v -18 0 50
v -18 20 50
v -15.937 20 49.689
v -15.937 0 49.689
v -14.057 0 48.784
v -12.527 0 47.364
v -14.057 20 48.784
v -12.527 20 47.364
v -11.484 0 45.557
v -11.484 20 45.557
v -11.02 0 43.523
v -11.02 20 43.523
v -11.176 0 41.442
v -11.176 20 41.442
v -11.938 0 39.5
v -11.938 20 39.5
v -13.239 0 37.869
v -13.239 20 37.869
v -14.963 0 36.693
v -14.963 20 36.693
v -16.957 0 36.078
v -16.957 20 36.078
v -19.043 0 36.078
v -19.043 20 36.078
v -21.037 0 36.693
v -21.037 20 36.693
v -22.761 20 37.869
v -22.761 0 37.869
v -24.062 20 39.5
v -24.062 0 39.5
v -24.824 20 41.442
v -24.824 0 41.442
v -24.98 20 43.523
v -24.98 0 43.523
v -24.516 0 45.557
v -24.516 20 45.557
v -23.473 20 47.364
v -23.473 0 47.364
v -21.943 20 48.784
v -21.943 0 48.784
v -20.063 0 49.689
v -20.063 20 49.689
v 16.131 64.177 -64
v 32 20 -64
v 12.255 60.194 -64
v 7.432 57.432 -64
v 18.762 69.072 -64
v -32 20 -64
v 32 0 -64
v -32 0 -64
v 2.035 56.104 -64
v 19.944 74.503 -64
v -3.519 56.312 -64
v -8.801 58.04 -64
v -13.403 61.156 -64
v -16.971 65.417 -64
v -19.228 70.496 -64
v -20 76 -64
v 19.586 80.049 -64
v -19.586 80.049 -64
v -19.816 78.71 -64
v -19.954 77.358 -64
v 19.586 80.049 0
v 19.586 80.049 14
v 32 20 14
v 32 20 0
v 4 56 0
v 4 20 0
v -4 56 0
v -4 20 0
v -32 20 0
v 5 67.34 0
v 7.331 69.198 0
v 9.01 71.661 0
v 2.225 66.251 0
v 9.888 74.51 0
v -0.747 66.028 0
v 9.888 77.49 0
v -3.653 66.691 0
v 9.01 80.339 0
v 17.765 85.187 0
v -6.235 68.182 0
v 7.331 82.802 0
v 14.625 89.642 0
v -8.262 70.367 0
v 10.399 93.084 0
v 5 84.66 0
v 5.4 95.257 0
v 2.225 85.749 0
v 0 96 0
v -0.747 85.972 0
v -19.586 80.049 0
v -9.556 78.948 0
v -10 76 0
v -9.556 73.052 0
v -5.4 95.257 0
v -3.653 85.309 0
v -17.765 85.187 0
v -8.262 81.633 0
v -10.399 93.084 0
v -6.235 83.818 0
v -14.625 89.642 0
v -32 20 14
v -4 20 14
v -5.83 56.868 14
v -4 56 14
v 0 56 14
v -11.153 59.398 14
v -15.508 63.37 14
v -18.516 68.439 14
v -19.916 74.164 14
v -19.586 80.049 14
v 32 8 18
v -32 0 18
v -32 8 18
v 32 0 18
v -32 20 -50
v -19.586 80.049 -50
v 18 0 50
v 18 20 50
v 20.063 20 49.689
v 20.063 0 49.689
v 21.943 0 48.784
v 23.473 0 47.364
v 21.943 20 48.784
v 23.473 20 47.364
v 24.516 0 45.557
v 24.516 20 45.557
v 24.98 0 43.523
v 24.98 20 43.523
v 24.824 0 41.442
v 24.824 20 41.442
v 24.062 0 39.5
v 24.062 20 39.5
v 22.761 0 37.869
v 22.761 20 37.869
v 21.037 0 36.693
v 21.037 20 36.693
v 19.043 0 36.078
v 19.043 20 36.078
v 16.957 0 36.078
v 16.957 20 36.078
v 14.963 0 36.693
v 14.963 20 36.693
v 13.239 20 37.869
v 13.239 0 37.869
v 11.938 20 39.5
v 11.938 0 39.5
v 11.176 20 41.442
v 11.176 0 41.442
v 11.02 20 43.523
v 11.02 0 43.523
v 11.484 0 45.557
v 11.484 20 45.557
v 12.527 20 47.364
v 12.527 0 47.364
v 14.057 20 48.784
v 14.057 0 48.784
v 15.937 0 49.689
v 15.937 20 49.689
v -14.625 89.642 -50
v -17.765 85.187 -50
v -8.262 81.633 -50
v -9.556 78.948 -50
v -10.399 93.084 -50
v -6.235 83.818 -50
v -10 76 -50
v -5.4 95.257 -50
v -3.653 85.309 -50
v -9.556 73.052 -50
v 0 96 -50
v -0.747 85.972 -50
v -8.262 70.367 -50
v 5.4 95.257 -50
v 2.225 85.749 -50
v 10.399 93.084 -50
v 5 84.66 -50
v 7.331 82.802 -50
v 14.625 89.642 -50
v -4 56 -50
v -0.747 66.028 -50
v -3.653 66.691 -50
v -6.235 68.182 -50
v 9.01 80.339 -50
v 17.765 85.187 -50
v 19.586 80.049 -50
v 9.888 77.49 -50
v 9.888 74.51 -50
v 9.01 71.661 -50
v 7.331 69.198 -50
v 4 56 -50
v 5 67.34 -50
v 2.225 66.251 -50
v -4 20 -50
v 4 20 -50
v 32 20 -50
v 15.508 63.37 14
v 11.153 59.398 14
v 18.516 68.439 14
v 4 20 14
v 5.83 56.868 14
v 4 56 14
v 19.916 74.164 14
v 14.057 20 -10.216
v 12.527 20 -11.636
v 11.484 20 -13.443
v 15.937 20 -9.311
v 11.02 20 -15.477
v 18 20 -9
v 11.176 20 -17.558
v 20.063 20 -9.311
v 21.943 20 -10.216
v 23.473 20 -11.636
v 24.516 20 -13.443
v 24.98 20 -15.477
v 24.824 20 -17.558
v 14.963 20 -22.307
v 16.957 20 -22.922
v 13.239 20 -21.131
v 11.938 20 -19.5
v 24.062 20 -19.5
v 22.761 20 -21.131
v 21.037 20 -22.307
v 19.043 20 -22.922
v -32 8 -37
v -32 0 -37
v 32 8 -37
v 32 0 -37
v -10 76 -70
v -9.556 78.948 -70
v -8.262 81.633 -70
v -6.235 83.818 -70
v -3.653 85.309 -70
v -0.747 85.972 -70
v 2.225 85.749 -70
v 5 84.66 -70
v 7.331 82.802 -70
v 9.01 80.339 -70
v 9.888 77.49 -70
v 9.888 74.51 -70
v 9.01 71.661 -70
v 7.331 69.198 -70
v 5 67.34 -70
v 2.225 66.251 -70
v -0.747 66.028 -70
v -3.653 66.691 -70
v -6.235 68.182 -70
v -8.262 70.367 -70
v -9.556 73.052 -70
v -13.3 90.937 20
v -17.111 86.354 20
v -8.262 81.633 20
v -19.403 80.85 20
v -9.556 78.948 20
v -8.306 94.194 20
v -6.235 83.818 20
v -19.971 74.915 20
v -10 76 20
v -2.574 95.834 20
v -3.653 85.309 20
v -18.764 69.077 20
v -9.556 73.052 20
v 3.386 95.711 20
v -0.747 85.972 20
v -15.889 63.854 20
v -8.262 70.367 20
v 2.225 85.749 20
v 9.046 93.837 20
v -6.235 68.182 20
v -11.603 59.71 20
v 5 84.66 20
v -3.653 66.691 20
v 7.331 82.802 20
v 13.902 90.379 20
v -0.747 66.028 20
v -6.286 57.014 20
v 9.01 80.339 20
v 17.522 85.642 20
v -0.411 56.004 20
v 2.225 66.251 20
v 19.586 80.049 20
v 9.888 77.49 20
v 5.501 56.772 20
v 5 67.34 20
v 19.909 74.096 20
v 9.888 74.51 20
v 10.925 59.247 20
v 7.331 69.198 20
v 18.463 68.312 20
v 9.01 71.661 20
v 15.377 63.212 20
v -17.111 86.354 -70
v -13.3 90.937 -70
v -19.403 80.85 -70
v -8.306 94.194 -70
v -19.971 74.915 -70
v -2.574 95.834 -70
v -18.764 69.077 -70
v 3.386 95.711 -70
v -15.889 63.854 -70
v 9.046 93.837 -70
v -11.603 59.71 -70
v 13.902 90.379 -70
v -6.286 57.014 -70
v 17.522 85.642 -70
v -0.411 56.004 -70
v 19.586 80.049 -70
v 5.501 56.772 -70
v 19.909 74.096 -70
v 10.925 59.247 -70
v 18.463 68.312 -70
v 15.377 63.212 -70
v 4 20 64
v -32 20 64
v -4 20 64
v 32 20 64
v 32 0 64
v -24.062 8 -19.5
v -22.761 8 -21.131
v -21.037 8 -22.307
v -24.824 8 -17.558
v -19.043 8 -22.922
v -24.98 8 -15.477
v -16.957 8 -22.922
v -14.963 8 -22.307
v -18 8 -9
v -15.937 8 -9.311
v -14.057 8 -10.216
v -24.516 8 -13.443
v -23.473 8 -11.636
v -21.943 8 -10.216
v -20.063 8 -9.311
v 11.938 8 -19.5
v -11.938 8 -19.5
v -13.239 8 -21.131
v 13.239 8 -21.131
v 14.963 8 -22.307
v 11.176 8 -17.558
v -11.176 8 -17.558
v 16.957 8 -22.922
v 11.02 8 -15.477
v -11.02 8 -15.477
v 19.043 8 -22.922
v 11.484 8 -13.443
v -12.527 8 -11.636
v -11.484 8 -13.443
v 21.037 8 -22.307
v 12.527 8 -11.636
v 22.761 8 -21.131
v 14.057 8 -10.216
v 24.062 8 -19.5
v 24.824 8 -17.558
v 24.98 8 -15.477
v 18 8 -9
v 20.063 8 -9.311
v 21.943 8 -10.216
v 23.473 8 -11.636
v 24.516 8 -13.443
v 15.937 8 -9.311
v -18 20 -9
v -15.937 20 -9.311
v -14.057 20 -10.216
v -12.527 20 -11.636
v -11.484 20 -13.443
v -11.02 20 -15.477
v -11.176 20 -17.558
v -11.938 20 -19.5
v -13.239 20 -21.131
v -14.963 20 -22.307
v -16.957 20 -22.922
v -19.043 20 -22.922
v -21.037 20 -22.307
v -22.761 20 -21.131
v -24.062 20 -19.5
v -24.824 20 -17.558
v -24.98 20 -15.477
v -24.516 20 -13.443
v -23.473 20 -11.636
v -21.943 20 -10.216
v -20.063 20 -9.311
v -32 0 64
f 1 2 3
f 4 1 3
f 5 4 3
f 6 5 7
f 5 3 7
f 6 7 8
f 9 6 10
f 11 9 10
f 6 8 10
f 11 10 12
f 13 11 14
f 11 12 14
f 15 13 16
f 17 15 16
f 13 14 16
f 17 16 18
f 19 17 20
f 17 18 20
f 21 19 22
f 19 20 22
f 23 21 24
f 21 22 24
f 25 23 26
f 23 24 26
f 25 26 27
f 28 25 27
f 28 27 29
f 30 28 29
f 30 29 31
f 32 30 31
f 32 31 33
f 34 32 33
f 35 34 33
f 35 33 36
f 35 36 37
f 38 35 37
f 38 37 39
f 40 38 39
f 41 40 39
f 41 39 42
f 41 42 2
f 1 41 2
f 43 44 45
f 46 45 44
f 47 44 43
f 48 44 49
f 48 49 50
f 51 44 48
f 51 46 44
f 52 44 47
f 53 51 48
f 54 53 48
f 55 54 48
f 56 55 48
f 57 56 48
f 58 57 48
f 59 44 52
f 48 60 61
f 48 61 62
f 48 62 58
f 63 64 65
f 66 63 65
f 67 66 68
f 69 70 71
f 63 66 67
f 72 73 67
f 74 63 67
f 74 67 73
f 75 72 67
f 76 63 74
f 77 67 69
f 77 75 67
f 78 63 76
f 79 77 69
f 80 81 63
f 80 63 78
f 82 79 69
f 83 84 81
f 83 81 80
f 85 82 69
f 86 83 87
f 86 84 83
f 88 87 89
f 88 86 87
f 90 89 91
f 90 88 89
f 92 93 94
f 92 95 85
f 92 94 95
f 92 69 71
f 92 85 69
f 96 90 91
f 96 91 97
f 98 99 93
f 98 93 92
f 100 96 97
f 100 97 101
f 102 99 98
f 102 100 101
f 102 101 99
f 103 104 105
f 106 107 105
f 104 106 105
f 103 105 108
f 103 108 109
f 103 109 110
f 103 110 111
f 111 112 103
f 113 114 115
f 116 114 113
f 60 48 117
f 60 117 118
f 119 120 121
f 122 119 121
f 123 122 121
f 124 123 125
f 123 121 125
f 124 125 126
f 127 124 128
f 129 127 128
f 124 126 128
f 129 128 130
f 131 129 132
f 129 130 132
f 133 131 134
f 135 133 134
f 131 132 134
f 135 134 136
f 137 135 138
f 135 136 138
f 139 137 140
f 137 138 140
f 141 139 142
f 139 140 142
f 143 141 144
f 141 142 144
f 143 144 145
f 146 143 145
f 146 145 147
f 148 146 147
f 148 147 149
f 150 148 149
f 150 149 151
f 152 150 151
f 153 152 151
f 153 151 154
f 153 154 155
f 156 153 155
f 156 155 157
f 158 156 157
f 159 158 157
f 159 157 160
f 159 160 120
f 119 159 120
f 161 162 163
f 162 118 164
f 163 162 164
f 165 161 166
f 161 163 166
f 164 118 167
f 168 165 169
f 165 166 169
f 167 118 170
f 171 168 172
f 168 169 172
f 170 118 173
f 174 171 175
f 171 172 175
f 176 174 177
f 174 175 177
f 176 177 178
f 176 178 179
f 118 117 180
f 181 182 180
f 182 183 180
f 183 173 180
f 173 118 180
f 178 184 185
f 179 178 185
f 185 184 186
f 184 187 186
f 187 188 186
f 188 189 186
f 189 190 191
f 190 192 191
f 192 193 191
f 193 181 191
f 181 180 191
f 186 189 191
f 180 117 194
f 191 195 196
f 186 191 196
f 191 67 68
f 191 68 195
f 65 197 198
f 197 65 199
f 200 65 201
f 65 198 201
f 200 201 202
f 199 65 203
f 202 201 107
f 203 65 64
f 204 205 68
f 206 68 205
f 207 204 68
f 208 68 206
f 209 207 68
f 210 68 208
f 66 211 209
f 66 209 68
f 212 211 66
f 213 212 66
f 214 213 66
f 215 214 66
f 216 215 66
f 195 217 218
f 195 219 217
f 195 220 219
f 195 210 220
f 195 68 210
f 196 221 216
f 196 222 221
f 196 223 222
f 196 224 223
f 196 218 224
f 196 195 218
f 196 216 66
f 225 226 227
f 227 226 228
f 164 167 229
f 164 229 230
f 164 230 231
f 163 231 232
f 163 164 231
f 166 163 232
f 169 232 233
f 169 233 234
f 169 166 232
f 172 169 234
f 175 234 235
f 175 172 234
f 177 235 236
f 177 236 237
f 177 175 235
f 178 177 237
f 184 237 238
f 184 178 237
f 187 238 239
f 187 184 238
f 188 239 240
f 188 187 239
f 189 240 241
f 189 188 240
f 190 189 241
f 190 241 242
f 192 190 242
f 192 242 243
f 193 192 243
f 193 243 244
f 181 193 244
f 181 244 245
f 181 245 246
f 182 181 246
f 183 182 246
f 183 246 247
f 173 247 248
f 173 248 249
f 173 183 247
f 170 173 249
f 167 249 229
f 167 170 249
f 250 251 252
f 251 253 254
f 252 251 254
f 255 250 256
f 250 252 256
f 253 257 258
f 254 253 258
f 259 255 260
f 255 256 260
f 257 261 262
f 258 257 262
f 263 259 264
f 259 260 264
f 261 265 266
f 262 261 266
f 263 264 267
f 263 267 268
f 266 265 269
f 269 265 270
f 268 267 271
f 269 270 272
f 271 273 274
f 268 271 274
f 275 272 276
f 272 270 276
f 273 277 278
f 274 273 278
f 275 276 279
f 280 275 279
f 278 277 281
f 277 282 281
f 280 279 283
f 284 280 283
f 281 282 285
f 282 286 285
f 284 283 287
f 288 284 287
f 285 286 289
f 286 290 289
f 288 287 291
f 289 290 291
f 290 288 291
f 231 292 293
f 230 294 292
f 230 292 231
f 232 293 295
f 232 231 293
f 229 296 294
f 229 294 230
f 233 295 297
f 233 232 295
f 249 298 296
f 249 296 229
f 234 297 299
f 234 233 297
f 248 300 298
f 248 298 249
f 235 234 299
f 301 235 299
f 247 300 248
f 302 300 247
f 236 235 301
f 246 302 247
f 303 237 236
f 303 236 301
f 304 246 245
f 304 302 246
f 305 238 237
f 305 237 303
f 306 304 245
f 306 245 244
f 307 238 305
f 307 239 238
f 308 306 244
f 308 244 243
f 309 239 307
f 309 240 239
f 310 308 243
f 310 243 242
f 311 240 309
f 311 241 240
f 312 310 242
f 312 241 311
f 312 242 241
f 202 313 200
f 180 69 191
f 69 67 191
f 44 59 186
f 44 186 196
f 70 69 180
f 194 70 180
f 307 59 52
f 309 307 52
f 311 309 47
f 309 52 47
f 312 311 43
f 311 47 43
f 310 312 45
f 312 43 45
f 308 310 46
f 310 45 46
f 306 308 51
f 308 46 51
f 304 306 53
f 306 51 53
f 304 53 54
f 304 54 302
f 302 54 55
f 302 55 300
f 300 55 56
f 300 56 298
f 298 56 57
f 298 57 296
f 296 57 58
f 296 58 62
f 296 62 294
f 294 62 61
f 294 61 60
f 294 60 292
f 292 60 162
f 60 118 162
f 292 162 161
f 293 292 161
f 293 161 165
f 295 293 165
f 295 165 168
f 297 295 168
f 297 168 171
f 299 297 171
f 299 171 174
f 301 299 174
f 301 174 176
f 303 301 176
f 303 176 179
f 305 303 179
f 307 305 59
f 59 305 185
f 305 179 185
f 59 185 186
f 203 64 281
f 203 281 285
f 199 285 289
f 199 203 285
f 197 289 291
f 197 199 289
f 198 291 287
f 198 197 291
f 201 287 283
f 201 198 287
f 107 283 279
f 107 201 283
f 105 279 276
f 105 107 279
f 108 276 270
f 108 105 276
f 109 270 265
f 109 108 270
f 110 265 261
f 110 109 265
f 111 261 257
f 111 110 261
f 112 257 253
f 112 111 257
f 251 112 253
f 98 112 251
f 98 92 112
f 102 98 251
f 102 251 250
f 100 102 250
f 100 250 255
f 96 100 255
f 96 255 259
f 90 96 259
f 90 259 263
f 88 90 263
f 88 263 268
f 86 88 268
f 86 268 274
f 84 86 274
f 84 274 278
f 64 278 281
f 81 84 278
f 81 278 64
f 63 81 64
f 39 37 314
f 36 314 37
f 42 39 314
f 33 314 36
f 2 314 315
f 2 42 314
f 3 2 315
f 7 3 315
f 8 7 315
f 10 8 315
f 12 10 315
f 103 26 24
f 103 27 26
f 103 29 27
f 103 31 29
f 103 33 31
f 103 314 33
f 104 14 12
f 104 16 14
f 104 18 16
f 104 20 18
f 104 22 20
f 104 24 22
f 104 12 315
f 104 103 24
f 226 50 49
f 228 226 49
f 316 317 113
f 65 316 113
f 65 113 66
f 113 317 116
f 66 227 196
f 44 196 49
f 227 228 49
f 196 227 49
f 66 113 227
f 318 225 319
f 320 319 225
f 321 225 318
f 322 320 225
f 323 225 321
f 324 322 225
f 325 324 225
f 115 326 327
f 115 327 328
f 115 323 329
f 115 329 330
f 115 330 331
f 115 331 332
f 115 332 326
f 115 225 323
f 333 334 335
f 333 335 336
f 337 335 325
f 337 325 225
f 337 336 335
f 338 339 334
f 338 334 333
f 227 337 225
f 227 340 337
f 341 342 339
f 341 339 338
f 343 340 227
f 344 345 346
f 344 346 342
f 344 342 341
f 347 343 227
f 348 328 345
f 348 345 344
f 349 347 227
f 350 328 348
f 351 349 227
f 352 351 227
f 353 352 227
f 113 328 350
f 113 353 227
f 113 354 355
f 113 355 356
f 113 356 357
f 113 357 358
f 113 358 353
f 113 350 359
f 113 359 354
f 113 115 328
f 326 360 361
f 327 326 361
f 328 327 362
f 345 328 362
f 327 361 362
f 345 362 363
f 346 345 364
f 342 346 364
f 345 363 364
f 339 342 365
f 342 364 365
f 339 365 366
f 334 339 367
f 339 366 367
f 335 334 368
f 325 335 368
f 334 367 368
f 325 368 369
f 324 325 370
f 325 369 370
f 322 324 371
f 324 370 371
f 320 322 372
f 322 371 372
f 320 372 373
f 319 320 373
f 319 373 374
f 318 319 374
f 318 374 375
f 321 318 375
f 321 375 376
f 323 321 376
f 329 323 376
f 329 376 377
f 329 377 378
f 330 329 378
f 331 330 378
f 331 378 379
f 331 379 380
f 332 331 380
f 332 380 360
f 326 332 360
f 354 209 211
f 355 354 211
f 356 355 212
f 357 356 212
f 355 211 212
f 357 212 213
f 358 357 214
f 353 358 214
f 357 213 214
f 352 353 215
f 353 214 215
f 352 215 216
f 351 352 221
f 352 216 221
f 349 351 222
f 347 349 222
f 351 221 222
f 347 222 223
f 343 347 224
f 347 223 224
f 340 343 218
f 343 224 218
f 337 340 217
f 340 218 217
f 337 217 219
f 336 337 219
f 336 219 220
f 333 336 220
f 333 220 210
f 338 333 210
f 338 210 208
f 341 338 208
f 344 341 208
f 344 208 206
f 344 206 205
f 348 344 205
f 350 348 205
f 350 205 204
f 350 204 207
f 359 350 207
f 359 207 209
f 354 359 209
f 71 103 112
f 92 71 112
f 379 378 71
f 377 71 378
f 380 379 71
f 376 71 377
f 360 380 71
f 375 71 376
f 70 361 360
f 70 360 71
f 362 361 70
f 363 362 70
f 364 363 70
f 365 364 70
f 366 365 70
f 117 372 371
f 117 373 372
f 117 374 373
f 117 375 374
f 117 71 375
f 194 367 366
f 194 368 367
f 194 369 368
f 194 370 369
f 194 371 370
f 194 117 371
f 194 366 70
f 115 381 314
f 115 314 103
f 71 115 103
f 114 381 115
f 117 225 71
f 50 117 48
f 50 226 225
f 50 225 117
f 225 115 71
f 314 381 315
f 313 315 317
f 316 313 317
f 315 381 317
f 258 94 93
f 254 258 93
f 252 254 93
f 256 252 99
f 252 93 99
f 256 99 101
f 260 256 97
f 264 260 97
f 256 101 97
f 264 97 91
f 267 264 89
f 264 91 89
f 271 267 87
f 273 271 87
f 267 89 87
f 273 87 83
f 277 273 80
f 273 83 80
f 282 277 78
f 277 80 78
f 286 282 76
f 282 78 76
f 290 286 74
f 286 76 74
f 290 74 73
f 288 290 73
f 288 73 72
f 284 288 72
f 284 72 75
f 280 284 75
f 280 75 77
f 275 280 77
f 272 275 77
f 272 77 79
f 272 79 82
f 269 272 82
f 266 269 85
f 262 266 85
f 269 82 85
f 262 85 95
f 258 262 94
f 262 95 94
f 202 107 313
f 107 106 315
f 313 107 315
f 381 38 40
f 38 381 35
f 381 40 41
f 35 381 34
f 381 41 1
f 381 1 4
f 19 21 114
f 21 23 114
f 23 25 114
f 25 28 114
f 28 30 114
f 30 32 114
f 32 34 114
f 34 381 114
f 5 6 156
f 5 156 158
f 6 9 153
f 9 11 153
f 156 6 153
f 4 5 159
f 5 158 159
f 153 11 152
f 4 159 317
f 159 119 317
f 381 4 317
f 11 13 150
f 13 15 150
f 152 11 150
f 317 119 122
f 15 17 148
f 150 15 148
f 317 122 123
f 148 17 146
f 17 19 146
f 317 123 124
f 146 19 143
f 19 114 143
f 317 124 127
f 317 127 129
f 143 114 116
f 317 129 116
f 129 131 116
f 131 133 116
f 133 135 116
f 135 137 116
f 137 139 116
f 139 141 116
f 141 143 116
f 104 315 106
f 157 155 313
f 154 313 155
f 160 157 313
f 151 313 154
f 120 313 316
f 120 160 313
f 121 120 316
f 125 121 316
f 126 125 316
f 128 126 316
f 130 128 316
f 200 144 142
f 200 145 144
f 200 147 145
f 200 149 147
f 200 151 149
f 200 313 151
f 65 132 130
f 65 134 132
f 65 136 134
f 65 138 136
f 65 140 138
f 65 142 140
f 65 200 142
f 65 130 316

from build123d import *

# Parameters (mm, degrees)
SKETCH1_W                = 64
SKETCH1_H                = 128
BOSS_EXTRUDE1_DEPTH      = 20
BOSS_EXTRUDE2_DEPTH      = 14
BOSS_EXTRUDE3_DEPTH      = 6
BOSS_EXTRUDE3_DEPTH_BACK = 14
SKETCH2_3_R              = 10
BOSS_EXTRUDE4_START      = -70
SKETCH4_R                = 20
SKETCH4_R_2              = 10
BOSS_EXTRUDE4_DEPTH      = 20
BOSS_EXTRUDE5_START      = -78
BOSS_EXTRUDE5_DEPTH      = 14
SKETCH8_W                = 64
SKETCH8_H                = 55
CUT_EXTRUDE1_DEPTH       = 8
SKETCH6_W                = 50
SKETCH6_H                = 36
BOSS_EXTRUDE6_DEPTH      = 4
SKETCH7_R                = 7
CUT_EXTRUDE2_DEPTH       = 109.166538264


with BuildPart() as part:
    # Sketch1 → Boss-Extrude1 (new body)
    with BuildSketch(Plane(origin=(0, 0, 0), x_dir=(1, 0, 0), z_dir=(0, 1, 0))):
        Rectangle(SKETCH1_W, SKETCH1_H)
    extrude(amount=BOSS_EXTRUDE1_DEPTH)

    # Sketch2 → Boss-Extrude2 (add)
    with BuildSketch(Plane(origin=(0, 0, -64), x_dir=(-1, 0, 0), z_dir=(0, 0, -1))):
        with BuildLine():
            Line((-19.585841233, 80.049052133), (-32, 20))
            Line((-32, 20), (32, 20))
            Line((32, 20), (19.585841233, 80.049052133))
            ThreePointArc((19.585841233, 80.049052133), (19.8961909, 78.035089105), (20, 76))
            ThreePointArc((20, 76), (-2.035089105, 56.1038091), (-19.585841233, 80.049052133))
        make_face()
    extrude(amount=-BOSS_EXTRUDE2_DEPTH)

    # Sketch2<3> → Boss-Extrude3 (add, two sides: drawn at the far end of the back side and taken through both)
    with BuildSketch(Plane(origin=(0, 0, -64), x_dir=(-1, 0, 0), z_dir=(0, 0, -1)).offset(-BOSS_EXTRUDE3_DEPTH_BACK)):
        with BuildLine():
            ThreePointArc((19.585841233, 80.049052133), (0, 96), (-19.585841233, 80.049052133))
            ThreePointArc((-19.585841233, 80.049052133), (-2.035089105, 56.1038091), (20, 76))
            ThreePointArc((20, 76), (19.8961909, 78.035089105), (19.585841233, 80.049052133))
        make_face()
        with Locations((0, 76)):
            Circle(SKETCH2_3_R, mode=Mode.SUBTRACT)
    extrude(amount=BOSS_EXTRUDE3_DEPTH + BOSS_EXTRUDE3_DEPTH_BACK)



with BuildPart() as body_2:
    # Sketch4 → Boss-Extrude4 (new body)
    with BuildSketch(Plane(origin=(0, 0, -70), x_dir=(-1, 0, 0), z_dir=(0, 0, -1)).offset(BOSS_EXTRUDE4_START)):
        with Locations((0, 76)):
            Circle(SKETCH4_R)
        with Locations((0, 76)):
            Circle(SKETCH4_R_2, mode=Mode.SUBTRACT)
    extrude(amount=-BOSS_EXTRUDE4_DEPTH)


with BuildPart() as part_1:
    add(part.part)

    add(body_2.part)  # Boss-Extrude5 merges body 2
    # Sketch5 → Boss-Extrude5 (add)
    with BuildSketch(Plane(origin=(0, 0, -64), x_dir=(-1, 0, 0), z_dir=(0, 0, -1)).offset(BOSS_EXTRUDE5_START)):
        with BuildLine():
            Line((32, 20), (19.585841233, 80.049052133))
            ThreePointArc((19.585841233, 80.049052133), (0, 56), (-19.585841233, 80.049052133))
            Line((-19.585841233, 80.049052133), (-32, 20))
            Line((-32, 20), (32, 20))
        make_face()
    extrude(amount=BOSS_EXTRUDE5_DEPTH)

    # Sketch8 → Cut-Extrude1 (cut)
    with BuildSketch(Plane.XZ):
        with Locations((0, -9.5)):
            Rectangle(SKETCH8_W, SKETCH8_H)
    extrude(amount=-CUT_EXTRUDE1_DEPTH, mode=Mode.SUBTRACT)

    # Sketch6 → Boss-Extrude6 (add, symmetric)
    with BuildSketch(Plane(origin=(0, 0, 0), x_dir=(0, 0, -1), z_dir=(1, 0, 0))):
        Polygon((-64, 20), (-14, 20), (-14, 56), align=None)
        with Locations((25, 38)):
            Rectangle(SKETCH6_W, SKETCH6_H)
    extrude(amount=BOSS_EXTRUDE6_DEPTH, both=True)

    # Sketch7 → Cut-Extrude2 (cut, through all)
    with BuildSketch(Plane(origin=(0, 20, 0), x_dir=(1, 0, 0), z_dir=(0, 1, 0))):
        with Locations((18, 16)):
            Circle(SKETCH7_R)
        with Locations((-18, 16)):
            Circle(SKETCH7_R)
        with Locations((18, -43)):
            Circle(SKETCH7_R)
        with Locations((-18, -43)):
            Circle(SKETCH7_R)
    extrude(amount=-CUT_EXTRUDE2_DEPTH, mode=Mode.SUBTRACT)


solid = part_1.part
